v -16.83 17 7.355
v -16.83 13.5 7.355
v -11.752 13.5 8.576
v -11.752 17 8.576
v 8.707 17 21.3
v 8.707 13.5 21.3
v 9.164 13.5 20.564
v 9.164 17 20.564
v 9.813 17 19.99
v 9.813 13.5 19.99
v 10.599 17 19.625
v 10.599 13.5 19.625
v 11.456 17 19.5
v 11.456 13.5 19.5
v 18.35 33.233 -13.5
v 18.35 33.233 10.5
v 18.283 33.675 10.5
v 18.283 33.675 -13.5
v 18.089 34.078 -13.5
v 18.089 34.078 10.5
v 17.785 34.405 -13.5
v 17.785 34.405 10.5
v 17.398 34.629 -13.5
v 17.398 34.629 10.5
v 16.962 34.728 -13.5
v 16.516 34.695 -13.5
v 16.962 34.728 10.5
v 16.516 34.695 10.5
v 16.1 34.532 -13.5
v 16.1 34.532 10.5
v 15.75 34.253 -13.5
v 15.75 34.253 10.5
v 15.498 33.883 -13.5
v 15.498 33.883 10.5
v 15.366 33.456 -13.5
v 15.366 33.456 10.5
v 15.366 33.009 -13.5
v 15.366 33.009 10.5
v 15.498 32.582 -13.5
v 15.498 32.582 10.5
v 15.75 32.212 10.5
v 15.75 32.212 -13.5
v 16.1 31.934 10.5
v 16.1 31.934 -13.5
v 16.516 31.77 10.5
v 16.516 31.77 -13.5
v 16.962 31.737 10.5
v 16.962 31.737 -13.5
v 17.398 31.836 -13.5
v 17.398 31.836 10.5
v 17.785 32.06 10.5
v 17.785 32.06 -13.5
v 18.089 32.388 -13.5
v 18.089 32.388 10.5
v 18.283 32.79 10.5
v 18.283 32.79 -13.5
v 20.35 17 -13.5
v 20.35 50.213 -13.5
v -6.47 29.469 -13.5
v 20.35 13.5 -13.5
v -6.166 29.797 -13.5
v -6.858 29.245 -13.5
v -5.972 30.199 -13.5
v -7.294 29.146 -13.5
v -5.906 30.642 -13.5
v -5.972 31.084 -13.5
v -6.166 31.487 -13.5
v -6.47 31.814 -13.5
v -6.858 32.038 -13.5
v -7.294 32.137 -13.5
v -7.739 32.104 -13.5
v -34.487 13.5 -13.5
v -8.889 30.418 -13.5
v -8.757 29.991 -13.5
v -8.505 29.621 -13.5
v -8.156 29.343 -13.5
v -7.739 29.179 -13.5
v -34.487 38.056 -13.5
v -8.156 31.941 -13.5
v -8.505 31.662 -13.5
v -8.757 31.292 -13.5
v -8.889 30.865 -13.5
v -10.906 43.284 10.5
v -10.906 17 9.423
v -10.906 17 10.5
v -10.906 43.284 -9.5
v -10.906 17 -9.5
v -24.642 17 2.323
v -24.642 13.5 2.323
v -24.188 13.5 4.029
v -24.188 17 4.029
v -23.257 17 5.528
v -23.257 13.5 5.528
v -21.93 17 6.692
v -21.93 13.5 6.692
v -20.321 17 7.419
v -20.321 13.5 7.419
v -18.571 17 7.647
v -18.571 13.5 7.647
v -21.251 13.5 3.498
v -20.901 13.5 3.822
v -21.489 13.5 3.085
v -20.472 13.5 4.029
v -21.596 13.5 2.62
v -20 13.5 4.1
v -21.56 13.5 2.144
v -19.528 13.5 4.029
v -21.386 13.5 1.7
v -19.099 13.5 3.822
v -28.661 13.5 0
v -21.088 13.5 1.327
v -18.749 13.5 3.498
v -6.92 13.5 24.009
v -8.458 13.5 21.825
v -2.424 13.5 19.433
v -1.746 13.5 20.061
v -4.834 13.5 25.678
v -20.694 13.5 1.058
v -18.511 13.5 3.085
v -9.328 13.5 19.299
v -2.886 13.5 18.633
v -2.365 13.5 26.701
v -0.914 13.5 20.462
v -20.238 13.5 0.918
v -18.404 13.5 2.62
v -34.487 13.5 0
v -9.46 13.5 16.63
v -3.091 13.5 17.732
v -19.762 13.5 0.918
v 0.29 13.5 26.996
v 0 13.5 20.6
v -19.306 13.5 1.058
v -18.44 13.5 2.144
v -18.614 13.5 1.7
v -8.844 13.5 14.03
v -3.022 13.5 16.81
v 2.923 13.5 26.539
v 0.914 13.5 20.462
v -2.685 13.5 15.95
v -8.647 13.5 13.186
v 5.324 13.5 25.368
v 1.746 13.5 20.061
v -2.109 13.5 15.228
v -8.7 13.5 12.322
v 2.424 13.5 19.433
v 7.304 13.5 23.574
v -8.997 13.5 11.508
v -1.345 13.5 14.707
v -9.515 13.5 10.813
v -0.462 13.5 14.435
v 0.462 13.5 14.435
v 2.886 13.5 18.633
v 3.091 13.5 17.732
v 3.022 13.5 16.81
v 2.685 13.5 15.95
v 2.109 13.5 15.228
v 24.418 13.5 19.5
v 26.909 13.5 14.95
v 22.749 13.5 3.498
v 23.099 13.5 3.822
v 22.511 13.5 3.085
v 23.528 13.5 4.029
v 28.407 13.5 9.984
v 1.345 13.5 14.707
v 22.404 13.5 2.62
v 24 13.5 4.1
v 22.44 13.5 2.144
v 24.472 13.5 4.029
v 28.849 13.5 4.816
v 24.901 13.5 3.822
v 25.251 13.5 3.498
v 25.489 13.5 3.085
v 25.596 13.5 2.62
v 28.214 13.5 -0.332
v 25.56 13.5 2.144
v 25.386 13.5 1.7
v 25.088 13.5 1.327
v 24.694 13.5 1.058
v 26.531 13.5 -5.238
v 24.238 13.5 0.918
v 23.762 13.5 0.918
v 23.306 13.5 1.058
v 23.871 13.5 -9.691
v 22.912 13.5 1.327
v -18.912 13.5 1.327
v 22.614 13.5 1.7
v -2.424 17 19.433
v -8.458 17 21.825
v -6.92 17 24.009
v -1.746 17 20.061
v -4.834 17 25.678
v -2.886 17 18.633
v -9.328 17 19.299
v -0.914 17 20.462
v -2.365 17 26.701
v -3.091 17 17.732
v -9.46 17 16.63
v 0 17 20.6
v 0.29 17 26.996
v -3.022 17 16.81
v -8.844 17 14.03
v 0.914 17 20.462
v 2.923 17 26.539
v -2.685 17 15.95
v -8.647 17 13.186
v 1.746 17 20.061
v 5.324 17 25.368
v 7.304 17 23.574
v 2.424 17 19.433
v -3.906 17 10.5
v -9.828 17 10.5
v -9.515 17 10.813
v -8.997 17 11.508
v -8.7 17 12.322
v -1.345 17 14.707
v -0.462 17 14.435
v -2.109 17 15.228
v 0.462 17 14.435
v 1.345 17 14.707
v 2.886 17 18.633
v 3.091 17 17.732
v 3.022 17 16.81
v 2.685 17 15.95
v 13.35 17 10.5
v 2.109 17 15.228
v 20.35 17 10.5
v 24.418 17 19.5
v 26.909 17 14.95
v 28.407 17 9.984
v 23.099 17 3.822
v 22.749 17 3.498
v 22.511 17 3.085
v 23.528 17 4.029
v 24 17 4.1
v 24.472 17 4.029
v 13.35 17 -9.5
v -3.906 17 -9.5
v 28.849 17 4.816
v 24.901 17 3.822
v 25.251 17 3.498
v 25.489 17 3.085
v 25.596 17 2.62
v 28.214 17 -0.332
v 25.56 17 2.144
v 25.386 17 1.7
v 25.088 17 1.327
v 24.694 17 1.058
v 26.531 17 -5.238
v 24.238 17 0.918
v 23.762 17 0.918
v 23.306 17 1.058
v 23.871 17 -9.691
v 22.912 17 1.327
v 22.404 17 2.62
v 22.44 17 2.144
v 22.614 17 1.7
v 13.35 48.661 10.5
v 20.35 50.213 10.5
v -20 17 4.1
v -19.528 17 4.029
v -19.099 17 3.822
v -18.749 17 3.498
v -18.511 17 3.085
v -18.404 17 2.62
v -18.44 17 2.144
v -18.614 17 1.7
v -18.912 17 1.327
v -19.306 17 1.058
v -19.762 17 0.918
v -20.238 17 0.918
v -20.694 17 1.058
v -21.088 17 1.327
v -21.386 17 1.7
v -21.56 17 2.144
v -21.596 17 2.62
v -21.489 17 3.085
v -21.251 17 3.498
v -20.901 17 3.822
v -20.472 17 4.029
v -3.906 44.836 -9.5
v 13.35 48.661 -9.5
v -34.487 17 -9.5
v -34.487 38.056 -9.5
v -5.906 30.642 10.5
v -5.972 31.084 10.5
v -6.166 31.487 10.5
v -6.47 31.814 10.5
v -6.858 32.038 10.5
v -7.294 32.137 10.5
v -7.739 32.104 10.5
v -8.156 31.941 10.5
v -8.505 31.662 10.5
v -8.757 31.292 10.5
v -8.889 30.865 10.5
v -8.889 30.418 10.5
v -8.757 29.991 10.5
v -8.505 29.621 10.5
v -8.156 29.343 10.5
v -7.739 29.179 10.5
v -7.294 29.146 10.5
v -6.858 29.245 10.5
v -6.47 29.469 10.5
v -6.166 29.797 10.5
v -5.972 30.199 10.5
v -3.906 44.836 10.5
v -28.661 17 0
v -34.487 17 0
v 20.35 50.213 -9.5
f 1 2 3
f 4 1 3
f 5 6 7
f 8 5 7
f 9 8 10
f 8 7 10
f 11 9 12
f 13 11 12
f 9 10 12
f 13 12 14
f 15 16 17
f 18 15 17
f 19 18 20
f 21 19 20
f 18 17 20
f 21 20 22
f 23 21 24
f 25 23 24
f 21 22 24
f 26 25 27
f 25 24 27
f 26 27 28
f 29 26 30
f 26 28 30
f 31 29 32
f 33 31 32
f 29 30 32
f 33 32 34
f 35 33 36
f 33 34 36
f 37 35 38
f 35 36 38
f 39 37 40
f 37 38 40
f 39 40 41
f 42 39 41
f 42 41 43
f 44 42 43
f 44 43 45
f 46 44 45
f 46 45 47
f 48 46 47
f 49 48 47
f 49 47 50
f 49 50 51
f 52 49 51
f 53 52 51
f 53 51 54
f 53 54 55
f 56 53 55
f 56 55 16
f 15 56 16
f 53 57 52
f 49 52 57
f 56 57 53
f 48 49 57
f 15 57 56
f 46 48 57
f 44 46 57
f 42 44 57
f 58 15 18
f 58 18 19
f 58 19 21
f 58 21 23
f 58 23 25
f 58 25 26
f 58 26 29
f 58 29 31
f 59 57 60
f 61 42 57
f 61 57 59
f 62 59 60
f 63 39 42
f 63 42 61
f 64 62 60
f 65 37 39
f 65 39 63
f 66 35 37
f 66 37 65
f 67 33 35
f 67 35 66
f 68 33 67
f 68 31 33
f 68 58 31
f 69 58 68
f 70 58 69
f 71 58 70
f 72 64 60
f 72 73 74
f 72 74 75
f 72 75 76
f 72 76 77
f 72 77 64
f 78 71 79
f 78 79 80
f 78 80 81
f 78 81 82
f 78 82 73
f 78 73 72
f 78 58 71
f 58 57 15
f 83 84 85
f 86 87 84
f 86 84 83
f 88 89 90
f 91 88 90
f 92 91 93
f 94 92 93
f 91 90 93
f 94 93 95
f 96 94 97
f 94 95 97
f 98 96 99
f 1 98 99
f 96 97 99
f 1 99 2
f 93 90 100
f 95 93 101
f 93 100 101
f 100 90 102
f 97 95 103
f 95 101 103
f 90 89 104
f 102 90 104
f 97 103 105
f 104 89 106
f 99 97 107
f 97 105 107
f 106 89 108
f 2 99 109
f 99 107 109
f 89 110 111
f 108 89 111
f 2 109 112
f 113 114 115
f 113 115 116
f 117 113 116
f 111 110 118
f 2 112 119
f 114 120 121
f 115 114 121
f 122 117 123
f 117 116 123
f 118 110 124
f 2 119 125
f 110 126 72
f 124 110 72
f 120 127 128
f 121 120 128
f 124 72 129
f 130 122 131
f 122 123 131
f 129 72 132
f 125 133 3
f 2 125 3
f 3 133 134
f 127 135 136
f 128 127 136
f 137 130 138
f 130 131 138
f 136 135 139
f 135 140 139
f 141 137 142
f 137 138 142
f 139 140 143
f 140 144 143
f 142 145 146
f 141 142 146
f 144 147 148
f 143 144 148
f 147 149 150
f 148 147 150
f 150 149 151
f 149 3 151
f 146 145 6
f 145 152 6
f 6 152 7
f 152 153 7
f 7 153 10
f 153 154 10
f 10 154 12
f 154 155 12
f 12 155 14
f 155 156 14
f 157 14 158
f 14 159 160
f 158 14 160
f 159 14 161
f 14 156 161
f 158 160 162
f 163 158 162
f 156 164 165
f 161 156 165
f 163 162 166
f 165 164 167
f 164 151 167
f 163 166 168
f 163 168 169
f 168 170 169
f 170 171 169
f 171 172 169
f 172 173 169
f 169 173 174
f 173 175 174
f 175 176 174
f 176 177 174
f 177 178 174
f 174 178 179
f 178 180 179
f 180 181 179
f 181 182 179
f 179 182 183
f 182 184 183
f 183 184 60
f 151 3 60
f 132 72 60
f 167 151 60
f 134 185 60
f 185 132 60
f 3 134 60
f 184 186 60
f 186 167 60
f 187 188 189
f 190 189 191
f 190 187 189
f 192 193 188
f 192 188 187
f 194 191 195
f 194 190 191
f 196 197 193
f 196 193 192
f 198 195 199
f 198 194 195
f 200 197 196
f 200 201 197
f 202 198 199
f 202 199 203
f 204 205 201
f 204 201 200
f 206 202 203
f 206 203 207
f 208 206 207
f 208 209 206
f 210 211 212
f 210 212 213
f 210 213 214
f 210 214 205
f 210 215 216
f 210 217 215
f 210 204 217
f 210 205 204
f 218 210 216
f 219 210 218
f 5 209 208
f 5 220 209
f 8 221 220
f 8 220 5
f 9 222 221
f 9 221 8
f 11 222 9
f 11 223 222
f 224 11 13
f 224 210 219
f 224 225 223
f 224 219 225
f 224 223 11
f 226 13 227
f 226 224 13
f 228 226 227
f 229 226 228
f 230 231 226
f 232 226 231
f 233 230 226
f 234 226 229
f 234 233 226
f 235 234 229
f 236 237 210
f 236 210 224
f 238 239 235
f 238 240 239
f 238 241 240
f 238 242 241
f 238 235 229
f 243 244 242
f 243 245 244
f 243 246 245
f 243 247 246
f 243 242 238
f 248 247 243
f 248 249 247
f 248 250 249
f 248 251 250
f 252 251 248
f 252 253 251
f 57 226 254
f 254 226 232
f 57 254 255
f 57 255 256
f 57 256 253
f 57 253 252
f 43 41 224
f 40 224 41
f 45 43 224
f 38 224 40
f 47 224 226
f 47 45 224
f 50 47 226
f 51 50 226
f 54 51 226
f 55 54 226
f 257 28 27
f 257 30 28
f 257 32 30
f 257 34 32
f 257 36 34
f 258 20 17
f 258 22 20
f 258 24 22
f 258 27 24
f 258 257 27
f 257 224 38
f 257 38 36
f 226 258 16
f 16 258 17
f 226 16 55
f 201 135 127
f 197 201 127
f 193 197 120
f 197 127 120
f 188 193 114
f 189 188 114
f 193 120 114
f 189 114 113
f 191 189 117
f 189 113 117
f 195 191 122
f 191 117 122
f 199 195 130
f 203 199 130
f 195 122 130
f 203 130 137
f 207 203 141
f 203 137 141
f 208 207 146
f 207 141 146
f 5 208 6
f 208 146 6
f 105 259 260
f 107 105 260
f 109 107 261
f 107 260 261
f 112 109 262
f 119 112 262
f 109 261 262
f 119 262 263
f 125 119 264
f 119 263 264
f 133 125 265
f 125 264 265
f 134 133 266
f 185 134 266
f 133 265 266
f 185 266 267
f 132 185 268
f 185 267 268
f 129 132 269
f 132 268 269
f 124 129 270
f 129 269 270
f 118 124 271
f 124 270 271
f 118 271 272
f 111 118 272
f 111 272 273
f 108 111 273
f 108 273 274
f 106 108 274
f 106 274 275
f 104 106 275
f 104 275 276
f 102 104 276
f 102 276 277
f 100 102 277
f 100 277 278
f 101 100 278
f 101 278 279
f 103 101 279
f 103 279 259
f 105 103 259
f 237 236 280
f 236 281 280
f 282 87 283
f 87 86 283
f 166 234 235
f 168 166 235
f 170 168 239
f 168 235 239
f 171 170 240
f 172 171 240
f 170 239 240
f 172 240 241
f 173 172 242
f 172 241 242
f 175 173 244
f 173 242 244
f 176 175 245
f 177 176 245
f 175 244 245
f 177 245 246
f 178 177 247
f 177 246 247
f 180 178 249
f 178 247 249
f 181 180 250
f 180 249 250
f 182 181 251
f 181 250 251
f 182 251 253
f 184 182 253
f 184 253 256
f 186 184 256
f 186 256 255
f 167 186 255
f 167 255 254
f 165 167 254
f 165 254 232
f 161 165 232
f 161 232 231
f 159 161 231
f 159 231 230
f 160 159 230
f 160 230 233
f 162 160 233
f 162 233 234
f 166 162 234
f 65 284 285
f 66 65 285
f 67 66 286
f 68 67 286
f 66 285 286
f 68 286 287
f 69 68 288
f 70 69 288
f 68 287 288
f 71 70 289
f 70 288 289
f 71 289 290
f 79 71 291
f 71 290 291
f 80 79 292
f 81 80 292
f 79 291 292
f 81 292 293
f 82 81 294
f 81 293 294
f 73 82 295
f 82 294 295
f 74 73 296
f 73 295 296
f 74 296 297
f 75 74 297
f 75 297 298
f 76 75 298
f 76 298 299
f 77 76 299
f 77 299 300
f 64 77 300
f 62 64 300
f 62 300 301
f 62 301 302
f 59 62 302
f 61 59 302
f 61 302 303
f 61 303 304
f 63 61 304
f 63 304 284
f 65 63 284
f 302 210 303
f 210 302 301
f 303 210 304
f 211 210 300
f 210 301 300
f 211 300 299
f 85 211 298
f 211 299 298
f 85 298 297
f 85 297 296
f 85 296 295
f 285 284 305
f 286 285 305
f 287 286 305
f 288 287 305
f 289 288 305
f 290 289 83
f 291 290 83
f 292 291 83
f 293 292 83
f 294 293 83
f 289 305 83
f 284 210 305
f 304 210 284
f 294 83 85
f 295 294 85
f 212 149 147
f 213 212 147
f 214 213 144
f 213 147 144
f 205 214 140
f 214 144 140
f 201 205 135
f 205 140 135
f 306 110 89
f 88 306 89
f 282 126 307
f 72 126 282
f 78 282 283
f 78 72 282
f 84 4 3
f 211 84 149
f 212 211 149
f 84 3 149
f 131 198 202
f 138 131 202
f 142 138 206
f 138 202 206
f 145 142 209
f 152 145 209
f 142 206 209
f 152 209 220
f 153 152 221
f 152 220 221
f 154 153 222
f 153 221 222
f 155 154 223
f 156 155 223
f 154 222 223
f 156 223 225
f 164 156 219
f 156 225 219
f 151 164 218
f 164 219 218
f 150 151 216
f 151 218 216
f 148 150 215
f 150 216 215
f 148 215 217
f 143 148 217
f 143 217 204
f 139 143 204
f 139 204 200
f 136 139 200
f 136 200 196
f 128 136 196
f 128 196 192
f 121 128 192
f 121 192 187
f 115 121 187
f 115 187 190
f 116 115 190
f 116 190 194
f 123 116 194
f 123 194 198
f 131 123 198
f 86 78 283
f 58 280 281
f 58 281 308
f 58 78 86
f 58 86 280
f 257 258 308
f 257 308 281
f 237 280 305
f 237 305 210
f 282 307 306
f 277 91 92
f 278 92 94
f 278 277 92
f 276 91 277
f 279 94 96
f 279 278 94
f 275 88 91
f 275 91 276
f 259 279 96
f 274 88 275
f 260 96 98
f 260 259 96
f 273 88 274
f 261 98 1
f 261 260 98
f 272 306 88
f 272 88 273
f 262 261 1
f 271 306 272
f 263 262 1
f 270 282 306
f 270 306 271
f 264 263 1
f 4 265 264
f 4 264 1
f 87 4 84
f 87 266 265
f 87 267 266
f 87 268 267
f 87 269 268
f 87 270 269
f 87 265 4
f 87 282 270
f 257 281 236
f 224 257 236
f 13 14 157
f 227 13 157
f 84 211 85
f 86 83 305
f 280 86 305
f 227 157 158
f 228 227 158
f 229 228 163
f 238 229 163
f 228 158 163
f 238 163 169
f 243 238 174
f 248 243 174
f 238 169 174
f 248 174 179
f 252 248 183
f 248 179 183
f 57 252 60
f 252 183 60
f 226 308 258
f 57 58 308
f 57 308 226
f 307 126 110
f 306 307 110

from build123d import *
from build123d.topology import SkipClean

# Parameters (mm, degrees)
CROQUIS1_W              = 70
CROQUIS1_H              = 65
EXTRUIR1_DEPTH          = 3.5
CROQUIS2_R              = 3.1
EXTRUIR2_DEPTH          = 5
EXTRUIR3_DEPTH          = 10
CROQUIS4_OUTSIDE_W      = 91.294
CROQUIS4_OUTSIDE_H      = 86.294
EXTRUIR4_DEPTH          = 10
REDONDEO1_R             = 3
EXTRUIR5_DEPTH          = 13.5
EXTRUIR6_DEPTH          = 3.5
CROQUIS7_R              = 1.6
EXTRUIR7_DEPTH          = 47.982330447
CROQUIS8_R              = 3.1
EXTRUIR8_DEPTH          = 5
CROQUIS9_W              = 0.7
CROQUIS9_H              = 10.5
EXTRUIR9_DEPTH          = 10
EXTRUIR10_DEPTH         = 63.752948337
EXTRUIR10_DEPTH_BACK    = 10
CROQUIS10_W             = 3.0625
CROQUIS10_H             = 5
SALIENTE_EXTRUIR1_DEPTH = 4
SALIENTE_EXTRUIR2_DEPTH = 20
CROQUIS14_R             = 1.5
CORTAR_EXTRUIR2_DEPTH   = 65


with BuildPart() as part:
    # Croquis1 → Extruir1 (new body)
    with BuildSketch(Plane(origin=(0, 0, 0), x_dir=(1, 0, 0), z_dir=(0, 1, 0))):
        Rectangle(CROQUIS1_W, CROQUIS1_H)
    extrude(amount=EXTRUIR1_DEPTH)

    # Croquis2 → Extruir2 (cut)
    with BuildSketch(Plane(origin=(0, 3.5, 0), x_dir=(1, 0, 0), z_dir=(0, 1, 0))):
        with Locations(Location((0, -17.5, 0), (0, 0, 270))):
            Circle(CROQUIS2_R)
    extrude(amount=-EXTRUIR2_DEPTH, mode=Mode.SUBTRACT)

    # Croquis3 → Extruir3 (add)
    with BuildSketch(Plane(origin=(0, 3.5, 0), x_dir=(1, 0, 0), z_dir=(0, 1, 0))):
        with BuildLine():
            Line((-34.4868, 13.5), (20.3496, 13.5))
            Line((20.3496, 13.5), (20.3496, 0))
            Line((20.3496, 0), (17.146428199, 0))
            ThreePointArc((17.146428199, 0), (22.955777517, -8.939493087), (24.418230894, -19.5))
            Line((24.418230894, -19.5), (9.287087811, -19.5))
            ThreePointArc((9.287087811, -19.5), (-3.635492607, -26.276855559), (-7.981176331, -12.347250794))
            Line((-7.981176331, -12.347250794), (-18.680510212, -1.647916913))
            ThreePointArc((-18.680510212, -1.647916913), (-17.932408832, -0.806327142), (-17.146428199, 0))
            Line((-17.146428199, 0), (-34.4868, 0))
            Line((-34.4868, 0), (-34.4868, 13.5))
        make_face()
        with BuildLine():
            Line((-32.9868, 1.5), (-12.961481397, 1.5))
            ThreePointArc((-12.961481397, 1.5), (-14.868021343, 0.048274597), (-16.613165932, -1.593940849))
            Line((-16.613165932, -1.593940849), (-5.999348286, -12.207758495))
            ThreePointArc((-5.999348286, -12.207758495), (-3.061467459, -24.89103626), (7.984359711, -18))
            Line((7.984359711, -18), (22.994564575, -18))
            ThreePointArc((22.994564575, -18), (20.451694563, -6.977253708), (12.961481397, 1.5))
            Line((12.961481397, 1.5), (18.8496, 1.5))
            Line((18.8496, 1.5), (18.8496, 12))
            Line((18.8496, 12), (-32.9868, 12))
            Line((-32.9868, 12), (-32.9868, 1.5))
        make_face(mode=Mode.SUBTRACT)
    extrude(amount=EXTRUIR3_DEPTH)

    # Croquis4 outside → Extruir4 (cut)
    with SkipClean():  # the faces are left unmerged after this step: merging them gives an invalid solid
        with BuildSketch(Plane(origin=(0, 3.5, 0), x_dir=(1, 0, 0), z_dir=(0, 1, 0))):
            Rectangle(CROQUIS4_OUTSIDE_W, CROQUIS4_OUTSIDE_H)
            with BuildLine():
                Line((-34.4868, 0), (-17.146428199, 0))
                ThreePointArc((-17.146428199, 0), (-17.932408832, -0.806327142), (-18.680510212, -1.647916913))
                Line((-18.680510212, -1.647916913), (-7.981176331, -12.347250794))
                ThreePointArc((-7.981176331, -12.347250794), (-3.635492607, -26.276855559), (9.287087811, -19.5))
                Line((9.287087811, -19.5), (24.418230894, -19.5))
                ThreePointArc((24.418230894, -19.5), (22.955777517, -8.939493087), (17.146428199, 0))
                Line((17.146428199, 0), (20.3496, 0))
                Line((20.3496, 0), (20.3496, 13.5))
                Line((20.3496, 13.5), (-34.4868, 13.5))
                Line((-34.4868, 13.5), (-34.4868, 0))
            make_face(mode=Mode.SUBTRACT)
        extrude(amount=-EXTRUIR4_DEPTH, mode=Mode.SUBTRACT)

    # Redondeo1
    redondeo1_edges = [part.edges().sort_by_distance(p)[0] for p in [
        (-7.981176331, 8.5, 12.347250794),
        (9.287087811, 8.5, 19.5),
        (-5.999348286, 8.5, 12.207758495),
        (7.984359711, 8.5, 18),
    ]]
    fillet(redondeo1_edges, radius=REDONDEO1_R)

    # Croquis5 → Extruir5 (add)
    with SkipClean():  # the faces are left unmerged after this step: merging them gives an invalid solid
        with BuildSketch(Plane.XZ):
            with BuildLine():
                Line((-18.680510212, 1.647916913), (-14.437869525, 5.8905576))
                ThreePointArc((-14.437869525, 5.8905576), (-21.723092903, 6.819250451), (-24.449770984, 0))
                Line((-24.449770984, 0), (-17.146428199, 0))
                ThreePointArc((-17.146428199, 0), (-17.932408832, 0.806327142), (-18.680510212, 1.647916913))
            make_face()
            with BuildLine():
                Line((20.3496, 0), (20.3496, -13.5))
                ThreePointArc((20.3496, -13.5), (28.665212431, 2.225567304), (24.418230894, 19.5))
                ThreePointArc((24.418230894, 19.5), (22.955777517, 8.939493087), (17.146428199, 0))
                Line((17.146428199, 0), (20.3496, 0))
            make_face()
        extrude(amount=-EXTRUIR5_DEPTH)

    # Chaflán1
    # the kernel refuses this chamfer: 5, 4.044665138 mm, written as the material it adds along each edge
    with BuildSketch(Plane(origin=(-14.437869525, 3.5, 5.8905576), x_dir=(-0.8768595348589333, 0, 0.4807466652270976), z_dir=(0, 1, 0))) as chafl_n1_piece_1:
        with BuildLine():
            Line((2.949791971, 0), (-1.211824758, 3.780414953))
            Line((-1.211824758, 3.780414953), (-1.307822013, 3.752405544))
            ThreePointArc((-1.307822013, 3.752405544), (-0.651776703, 1.876825504), (-0.095997255, -0.02800941))
            Line((-0.095997255, -0.02800941), (0.02800941, -0.095997255))
            ThreePointArc((0.02800941, -0.095997255), (1.47002525, 0.136406993), (2.931105495, -0.098238565))
            Line((2.931105495, -0.098238565), (2.949791971, 0))
        make_face()
    extrude(amount=10)
    with BuildSketch(Plane(origin=(-24.449770984, 3.5, 0), x_dir=(-0.008036803743584595, 0, 0.9999677043712897), z_dir=(0, 1, 0))) as chafl_n1_piece_2:
        with BuildLine():
            Line((2.423263449, 0), (-0.064845869, -4.38542071))
            Line((-0.064845869, -4.38542071), (-0.164842639, -4.386224391))
            ThreePointArc((-0.164842639, -4.386224391), (-0.082377051, -2.193111839), (-0.09999677, -0.00080368))
            Line((-0.09999677, -0.00080368), (0.026691621, 0.096371974))
            ThreePointArc((0.026691621, 0.096371974), (1.204598314, -0.104316531), (2.411212242, 0.099271186))
            Line((2.411212242, 0.099271186), (2.423263449, 0))
        make_face()
    extrude(amount=10)
    with BuildSketch(Plane(origin=(-24.449770984, 0, 0), x_dir=(-0.9997395779240649, 0, -0.022820524363231526), z_dir=(0, 1, 0))) as chafl_n1_piece_3:
        with BuildLine():
            Line((4.385900112, 0), (-0.035828136, 2.422998574))
            Line((-0.035828136, 2.422998574), (-0.134910293, 2.409480951))
            ThreePointArc((-0.134910293, 2.409480951), (0.08649505, 1.206008973), (-0.096756078, 0.025263837))
            Line((-0.096756078, 0.025263837), (0.002282052, -0.099973958))
            ThreePointArc((0.002282052, -0.099973958), (2.194090072, -0.04994272), (4.388182164, -0.099973958))
            Line((4.388182164, -0.099973958), (4.385900112, 0))
        make_face()
    extrude(amount=3.5)
    with BuildSketch(Plane(origin=(-14.437869525, 0, 5.8905576), x_dir=(0.7254657554746632, 0, 0.6882582637597433), z_dir=(0, 1, 0))) as chafl_n1_piece_4:
        with BuildLine():
            Line((3.96989376, 0), (-0.900434913, -2.809001538))
            Line((-0.900434913, -2.809001538), (-0.98828054, -2.761219262))
            ThreePointArc((-0.98828054, -2.761219262), (-0.318834214, -1.441501248), (-0.099965384, 0.002630967))
            Line((-0.099965384, 0.002630967), (0.002630967, 0.099965384))
            ThreePointArc((0.002630967, 0.099965384), (1.986203869, 0.047760165), (3.972524727, 0.099965384))
            Line((3.972524727, 0.099965384), (3.96989376, 0))
        make_face()
    extrude(amount=3.5)


with BuildPart() as body_2:
    # Croquis6 → Extruir6 (new body)
    with BuildSketch(Plane(origin=(0, 13.5, 0), x_dir=(1, 0, 0), z_dir=(0, 1, 0))):
        with BuildLine():
            Line((-34.4868, 13.5), (-34.4868, 0))
            Line((-34.4868, 0), (-28.661374979, 0))
            Line((-28.661374979, 0), (-24.642400208, -2.323096648))
            ThreePointArc((-24.642400208, -2.323096648), (-21.929637735, -6.692039268), (-16.829963308, -7.355409896))
            Line((-16.829963308, -7.355409896), (-11.752306982, -8.576120143))
            Line((-11.752306982, -8.576120143), (-9.515139435, -10.813287689))
            ThreePointArc((-9.515139435, -10.813287689), (-8.69974084, -12.321679102), (-8.843709432, -14.030302105))
            ThreePointArc((-8.843709432, -14.030302105), (-3.635492607, -26.276855559), (8.70689382, -21.3))
            ThreePointArc((8.70689382, -21.3), (9.813271565, -19.99001992), (11.456439237, -19.5))
            Line((11.456439237, -19.5), (24.418230894, -19.5))
            ThreePointArc((24.418230894, -19.5), (28.665212431, -2.225567304), (20.3496, 13.5))
            Line((20.3496, 13.5), (-34.4868, 13.5))
        make_face()
    extrude(amount=EXTRUIR6_DEPTH)


with BuildPart() as extruir7_tool:
    # Croquis7 → Extruir7 (new, through all)
    with BuildSketch(Plane(origin=(0, 17, 0), x_dir=(1, 0, 0), z_dir=(0, 1, 0))):
        with Locations(Location((-20, -2.5, 0), (0, 0, 270))):
            Circle(CROQUIS7_R)
        with Locations(Location((24, -2.5, 0), (0, 0, 270))):
            Circle(CROQUIS7_R)
    extrude(amount=-EXTRUIR7_DEPTH)


with BuildPart() as part_1:
    add(part.part)

    # Extruir7: cut by extruir7_tool
    add(extruir7_tool.part, mode=Mode.SUBTRACT)

    # Croquis9 → Extruir9 (cut)
    with BuildSketch(Plane(origin=(0, 13.5, 0), x_dir=(1, 0, 0), z_dir=(0, 1, 0))):
        with Locations((19.1996, 6.75)):
            Rectangle(CROQUIS9_W, CROQUIS9_H)
    extrude(amount=-EXTRUIR9_DEPTH, mode=Mode.SUBTRACT)

    # Croquis10 → Extruir10 (cut, two sides: drawn at the far end of the back side and taken through both)
    with BuildSketch(Plane.ZY.offset(-19.5496).offset(-EXTRUIR10_DEPTH_BACK)):
        with Locations((-8.9375, 8.5)):
            Rectangle(CROQUIS10_W, CROQUIS10_H)
    extrude(amount=EXTRUIR10_DEPTH + EXTRUIR10_DEPTH_BACK, mode=Mode.SUBTRACT)


with BuildPart() as body_2_1:
    add(body_2.part)

    # Extruir7: cut by extruir7_tool
    add(extruir7_tool.part, mode=Mode.SUBTRACT)

    # Croquis8 → Extruir8 (cut)
    with BuildSketch(Plane(origin=(0, 17, 0), x_dir=(1, 0, 0), z_dir=(0, 1, 0))):
        with Locations(Location((0, -17.5, 0), (0, 0, 270))):
            Circle(CROQUIS8_R)
    extrude(amount=-EXTRUIR8_DEPTH, mode=Mode.SUBTRACT)

    # Croquis11 → Saliente-Extruir1 (add)
    with BuildSketch(Plane(origin=(0, 0, -13.5), x_dir=(-1, 0, 0), z_dir=(0, 0, -1))):
        Polygon((34.4868, 17), (34.4868, 38.05596306), (-20.3496, 50.212900258), (-20.3496, 17), align=None)
    extrude(amount=-SALIENTE_EXTRUIR1_DEPTH)

    # Croquis13 → Saliente-Extruir2 (add)
    with BuildSketch(Plane.XY.offset(-9.5)):
        Polygon((-10.905631326, 43.283782293), (-3.905631326, 44.835644932), (-3.905631326, 17), (-10.905631326, 17), align=None)
        Polygon((20.3496, 50.212900258), (13.3496, 48.66103762), (13.3496, 17), (20.3496, 17), align=None)
    extrude(amount=SALIENTE_EXTRUIR2_DEPTH)

    # Croquis14 → Cortar-Extruir2 (cut)
    with BuildSketch(Plane.XY.offset(10.5)):
        with Locations((-7.405631326, 30.64159382)):
            Circle(CROQUIS14_R)
        with Locations((16.8496, 33.23257477)):
            Circle(CROQUIS14_R)
    extrude(amount=-CORTAR_EXTRUIR2_DEPTH, mode=Mode.SUBTRACT)


solid = body_2_1.part
